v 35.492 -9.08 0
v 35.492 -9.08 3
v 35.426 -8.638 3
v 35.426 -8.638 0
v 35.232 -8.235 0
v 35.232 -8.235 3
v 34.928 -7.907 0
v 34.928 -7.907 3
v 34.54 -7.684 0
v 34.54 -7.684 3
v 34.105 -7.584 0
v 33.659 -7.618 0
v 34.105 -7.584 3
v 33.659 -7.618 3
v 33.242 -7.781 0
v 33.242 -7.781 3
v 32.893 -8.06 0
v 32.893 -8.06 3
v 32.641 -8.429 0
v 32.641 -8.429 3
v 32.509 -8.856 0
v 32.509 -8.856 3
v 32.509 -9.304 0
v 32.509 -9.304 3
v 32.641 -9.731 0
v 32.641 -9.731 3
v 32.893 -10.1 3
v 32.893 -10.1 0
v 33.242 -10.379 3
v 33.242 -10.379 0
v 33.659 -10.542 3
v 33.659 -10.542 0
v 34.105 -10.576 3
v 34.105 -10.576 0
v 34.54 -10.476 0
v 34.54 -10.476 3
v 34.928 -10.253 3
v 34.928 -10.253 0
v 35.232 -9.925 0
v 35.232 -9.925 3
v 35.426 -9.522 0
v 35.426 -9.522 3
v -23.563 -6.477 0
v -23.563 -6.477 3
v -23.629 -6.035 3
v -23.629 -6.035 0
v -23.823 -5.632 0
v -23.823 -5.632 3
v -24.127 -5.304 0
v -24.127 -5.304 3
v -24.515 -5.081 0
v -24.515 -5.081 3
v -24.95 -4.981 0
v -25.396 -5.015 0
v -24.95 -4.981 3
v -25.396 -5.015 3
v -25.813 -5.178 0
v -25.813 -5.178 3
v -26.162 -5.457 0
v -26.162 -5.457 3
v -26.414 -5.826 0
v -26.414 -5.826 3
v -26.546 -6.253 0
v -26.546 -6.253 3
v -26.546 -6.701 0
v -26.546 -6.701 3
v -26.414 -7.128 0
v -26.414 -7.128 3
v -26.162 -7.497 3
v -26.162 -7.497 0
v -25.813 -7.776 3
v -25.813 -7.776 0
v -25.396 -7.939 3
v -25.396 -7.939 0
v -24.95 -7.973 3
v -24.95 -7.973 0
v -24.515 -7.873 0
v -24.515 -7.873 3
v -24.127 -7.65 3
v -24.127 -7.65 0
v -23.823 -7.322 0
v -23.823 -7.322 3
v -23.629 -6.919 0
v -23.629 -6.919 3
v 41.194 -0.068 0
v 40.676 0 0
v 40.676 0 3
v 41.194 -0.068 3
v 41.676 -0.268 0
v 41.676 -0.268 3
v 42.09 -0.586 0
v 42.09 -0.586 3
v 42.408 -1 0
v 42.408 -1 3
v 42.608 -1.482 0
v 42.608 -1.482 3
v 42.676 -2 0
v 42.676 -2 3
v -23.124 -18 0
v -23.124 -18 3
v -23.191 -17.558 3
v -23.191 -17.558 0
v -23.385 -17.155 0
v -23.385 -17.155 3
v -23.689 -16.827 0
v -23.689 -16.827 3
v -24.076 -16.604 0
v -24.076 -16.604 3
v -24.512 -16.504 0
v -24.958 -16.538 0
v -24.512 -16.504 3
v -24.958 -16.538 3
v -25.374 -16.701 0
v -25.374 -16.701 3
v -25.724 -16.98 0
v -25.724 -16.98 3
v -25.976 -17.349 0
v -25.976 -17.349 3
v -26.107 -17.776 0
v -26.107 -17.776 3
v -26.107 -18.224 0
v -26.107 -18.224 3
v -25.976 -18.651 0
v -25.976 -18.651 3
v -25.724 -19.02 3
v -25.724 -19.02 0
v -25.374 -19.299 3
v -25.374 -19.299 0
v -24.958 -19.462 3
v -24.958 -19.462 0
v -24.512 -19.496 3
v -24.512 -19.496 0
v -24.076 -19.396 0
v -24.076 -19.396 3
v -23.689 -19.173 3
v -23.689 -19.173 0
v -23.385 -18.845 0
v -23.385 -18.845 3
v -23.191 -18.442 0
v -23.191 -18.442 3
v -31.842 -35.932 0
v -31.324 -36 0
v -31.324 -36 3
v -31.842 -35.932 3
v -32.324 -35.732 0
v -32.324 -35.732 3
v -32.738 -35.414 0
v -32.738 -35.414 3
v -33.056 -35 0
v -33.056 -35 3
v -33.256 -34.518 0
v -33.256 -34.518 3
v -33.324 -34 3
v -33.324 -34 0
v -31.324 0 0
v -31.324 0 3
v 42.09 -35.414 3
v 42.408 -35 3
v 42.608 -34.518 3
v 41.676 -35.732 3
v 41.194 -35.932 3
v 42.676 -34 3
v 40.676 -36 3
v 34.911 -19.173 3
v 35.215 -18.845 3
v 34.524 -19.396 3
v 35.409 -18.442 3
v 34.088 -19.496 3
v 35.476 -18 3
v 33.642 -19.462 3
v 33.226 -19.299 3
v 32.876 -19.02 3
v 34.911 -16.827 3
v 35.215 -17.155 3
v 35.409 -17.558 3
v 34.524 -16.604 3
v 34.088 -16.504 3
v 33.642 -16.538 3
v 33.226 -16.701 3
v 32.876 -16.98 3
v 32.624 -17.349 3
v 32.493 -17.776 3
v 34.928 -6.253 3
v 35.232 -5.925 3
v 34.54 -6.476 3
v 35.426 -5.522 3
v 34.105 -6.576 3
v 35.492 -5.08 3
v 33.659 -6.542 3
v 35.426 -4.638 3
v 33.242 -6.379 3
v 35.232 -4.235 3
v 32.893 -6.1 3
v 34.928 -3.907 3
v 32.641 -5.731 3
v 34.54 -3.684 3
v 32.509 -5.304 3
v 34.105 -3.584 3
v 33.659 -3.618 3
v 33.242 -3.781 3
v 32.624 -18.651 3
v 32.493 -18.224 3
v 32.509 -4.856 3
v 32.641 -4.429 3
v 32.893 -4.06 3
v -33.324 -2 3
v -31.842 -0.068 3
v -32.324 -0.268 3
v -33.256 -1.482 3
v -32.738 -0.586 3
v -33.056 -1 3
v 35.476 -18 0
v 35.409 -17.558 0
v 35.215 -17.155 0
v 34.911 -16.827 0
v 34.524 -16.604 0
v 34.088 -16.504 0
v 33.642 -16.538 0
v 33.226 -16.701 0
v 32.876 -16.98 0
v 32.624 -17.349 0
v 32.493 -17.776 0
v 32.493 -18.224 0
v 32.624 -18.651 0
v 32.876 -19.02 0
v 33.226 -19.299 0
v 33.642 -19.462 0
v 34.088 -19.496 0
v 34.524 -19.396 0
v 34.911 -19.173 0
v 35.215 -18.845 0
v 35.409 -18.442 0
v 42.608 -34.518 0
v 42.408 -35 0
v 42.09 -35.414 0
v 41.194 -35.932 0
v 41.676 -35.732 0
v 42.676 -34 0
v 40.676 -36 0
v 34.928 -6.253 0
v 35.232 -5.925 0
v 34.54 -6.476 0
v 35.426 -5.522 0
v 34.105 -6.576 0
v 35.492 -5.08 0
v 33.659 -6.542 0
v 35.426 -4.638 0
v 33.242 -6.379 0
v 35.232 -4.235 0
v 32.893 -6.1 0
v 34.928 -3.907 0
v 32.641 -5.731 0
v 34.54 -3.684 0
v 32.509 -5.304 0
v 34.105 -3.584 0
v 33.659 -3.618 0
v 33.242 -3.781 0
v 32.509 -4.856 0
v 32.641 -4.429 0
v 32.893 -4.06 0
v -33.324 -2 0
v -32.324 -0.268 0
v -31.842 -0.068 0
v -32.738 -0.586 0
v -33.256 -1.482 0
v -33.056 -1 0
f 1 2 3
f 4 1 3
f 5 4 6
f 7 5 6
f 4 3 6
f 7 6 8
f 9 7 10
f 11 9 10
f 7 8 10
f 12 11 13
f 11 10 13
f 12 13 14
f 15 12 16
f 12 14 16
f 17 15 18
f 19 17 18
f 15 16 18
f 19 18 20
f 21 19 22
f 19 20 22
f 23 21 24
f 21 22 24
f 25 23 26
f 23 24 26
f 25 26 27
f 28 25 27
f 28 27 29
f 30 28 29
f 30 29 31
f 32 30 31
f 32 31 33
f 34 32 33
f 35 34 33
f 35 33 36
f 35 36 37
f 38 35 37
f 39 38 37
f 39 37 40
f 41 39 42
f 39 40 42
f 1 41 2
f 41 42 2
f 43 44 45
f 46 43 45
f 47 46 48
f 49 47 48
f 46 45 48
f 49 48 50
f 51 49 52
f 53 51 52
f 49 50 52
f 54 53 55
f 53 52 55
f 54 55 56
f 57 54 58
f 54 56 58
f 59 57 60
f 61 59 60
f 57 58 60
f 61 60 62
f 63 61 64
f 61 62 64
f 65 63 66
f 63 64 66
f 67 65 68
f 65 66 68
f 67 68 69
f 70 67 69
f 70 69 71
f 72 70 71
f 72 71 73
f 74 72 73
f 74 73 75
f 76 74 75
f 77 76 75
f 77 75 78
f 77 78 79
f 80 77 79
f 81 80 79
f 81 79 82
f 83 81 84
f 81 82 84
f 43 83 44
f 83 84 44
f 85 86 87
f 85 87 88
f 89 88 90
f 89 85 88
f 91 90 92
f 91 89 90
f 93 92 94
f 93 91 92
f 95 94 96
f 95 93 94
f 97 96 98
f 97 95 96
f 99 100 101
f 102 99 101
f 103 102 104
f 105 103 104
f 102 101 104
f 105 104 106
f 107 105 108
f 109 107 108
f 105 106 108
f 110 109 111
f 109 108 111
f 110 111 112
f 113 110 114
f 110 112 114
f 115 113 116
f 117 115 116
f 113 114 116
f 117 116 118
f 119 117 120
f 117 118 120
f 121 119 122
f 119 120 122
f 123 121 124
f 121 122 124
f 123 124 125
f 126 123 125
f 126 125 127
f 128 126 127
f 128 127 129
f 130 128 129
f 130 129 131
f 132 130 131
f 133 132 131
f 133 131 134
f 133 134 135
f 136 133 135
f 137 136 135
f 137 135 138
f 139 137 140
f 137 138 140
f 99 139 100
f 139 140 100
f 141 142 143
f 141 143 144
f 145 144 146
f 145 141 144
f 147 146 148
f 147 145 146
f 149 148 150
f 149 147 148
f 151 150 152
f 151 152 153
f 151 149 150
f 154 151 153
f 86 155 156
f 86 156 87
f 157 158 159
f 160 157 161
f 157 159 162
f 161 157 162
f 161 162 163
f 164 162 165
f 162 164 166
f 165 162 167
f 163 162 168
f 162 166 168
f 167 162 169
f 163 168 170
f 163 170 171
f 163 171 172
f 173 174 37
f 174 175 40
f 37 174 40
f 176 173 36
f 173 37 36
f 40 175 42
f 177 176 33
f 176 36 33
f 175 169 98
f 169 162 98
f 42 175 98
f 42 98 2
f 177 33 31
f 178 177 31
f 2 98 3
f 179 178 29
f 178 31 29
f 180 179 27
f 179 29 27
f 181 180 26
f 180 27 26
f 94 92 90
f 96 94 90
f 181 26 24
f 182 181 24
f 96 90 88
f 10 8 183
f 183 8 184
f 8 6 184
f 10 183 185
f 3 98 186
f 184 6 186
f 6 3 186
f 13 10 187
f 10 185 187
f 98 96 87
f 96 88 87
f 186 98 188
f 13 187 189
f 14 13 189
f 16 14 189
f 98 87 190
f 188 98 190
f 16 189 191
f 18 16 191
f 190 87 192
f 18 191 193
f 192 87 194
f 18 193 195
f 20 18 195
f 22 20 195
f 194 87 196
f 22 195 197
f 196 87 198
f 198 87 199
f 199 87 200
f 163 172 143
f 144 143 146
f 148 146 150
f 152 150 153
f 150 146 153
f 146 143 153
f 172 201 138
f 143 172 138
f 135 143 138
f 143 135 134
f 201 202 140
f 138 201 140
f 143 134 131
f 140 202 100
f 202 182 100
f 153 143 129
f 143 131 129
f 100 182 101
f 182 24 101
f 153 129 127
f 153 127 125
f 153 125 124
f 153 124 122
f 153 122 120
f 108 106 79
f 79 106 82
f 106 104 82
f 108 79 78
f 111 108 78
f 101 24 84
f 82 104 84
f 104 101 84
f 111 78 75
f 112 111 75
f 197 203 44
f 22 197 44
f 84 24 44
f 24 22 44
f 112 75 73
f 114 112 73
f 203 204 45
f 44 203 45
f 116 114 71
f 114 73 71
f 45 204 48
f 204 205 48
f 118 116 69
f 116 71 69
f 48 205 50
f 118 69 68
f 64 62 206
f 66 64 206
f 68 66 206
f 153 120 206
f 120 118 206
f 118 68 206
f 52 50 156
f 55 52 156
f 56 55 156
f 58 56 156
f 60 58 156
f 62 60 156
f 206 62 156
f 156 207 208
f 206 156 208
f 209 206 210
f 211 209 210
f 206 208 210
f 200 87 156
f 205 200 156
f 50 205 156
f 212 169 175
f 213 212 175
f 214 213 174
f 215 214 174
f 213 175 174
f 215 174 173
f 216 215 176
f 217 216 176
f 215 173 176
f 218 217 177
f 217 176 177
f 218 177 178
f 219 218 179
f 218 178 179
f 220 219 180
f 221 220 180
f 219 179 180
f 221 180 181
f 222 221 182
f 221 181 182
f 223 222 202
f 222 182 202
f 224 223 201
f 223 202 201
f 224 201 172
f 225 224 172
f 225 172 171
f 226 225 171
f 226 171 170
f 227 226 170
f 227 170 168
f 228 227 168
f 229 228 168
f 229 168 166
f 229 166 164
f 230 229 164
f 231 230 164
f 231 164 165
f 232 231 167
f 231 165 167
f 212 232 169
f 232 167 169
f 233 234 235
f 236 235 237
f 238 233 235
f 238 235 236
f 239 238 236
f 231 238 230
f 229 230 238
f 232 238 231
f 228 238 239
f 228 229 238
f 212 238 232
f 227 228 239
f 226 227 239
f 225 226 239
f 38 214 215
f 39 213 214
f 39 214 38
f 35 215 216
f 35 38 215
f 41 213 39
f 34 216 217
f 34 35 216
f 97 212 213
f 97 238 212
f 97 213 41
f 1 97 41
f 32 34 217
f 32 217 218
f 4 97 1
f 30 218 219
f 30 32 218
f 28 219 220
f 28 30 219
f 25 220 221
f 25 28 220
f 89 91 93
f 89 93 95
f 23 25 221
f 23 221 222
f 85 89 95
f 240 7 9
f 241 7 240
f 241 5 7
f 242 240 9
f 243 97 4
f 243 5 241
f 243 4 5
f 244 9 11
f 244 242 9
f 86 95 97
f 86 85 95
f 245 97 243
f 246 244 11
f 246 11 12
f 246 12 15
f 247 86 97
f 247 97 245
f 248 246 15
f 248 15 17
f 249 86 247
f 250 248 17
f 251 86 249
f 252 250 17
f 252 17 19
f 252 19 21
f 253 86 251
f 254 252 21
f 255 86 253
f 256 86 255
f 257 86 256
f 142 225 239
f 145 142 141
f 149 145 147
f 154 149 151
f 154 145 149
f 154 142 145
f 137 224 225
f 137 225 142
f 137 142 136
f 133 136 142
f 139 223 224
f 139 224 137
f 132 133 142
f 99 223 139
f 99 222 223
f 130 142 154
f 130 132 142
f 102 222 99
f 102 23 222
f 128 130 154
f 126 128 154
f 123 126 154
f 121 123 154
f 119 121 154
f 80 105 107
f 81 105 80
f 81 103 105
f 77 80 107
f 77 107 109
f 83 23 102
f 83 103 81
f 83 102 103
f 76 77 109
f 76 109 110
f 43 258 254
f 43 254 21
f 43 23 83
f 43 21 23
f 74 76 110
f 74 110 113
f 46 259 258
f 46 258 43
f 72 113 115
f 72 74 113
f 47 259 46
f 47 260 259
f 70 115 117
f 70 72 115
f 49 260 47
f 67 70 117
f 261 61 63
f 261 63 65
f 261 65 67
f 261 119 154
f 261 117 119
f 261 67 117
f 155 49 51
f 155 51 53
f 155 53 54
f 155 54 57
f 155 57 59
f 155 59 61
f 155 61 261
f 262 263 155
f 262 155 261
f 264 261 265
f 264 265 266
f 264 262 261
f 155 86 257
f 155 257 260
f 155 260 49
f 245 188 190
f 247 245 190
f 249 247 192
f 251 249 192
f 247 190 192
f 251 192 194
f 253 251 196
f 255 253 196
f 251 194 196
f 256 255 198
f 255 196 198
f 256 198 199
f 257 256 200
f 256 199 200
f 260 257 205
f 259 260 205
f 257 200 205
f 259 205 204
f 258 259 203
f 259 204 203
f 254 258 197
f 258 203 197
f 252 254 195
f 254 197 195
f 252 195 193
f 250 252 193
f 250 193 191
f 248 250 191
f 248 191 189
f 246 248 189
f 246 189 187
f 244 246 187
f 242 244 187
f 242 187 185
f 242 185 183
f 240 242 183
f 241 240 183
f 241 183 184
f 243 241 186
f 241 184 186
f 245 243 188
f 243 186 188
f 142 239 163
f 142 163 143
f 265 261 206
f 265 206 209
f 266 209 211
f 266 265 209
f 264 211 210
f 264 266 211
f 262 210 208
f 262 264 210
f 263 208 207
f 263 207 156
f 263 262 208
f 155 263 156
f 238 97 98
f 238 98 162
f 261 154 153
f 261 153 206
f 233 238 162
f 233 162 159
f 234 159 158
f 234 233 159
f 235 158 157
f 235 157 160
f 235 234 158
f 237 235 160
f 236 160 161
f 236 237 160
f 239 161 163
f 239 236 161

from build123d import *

# Parameters (mm, degrees)
EXTRUDE_1_DEPTH     = 3
SKETCH_2_R          = 1.5
CUT_EXTRUDE_1_DEPTH = 3


with BuildPart() as part:
    # 草图1 → 凸台-拉伸1 (new body)
    with BuildSketch(Plane.XY):
        with BuildLine():
            Line((-31.324082862, 0), (40.675917138, 0))
            ThreePointArc((40.675917138, 0), (42.090130701, -0.585786438), (42.675917138, -2))
            Line((42.675917138, -2), (42.675917138, -34))
            ThreePointArc((42.675917138, -34), (42.090130701, -35.414213562), (40.675917138, -36))
            Line((40.675917138, -36), (-31.324082862, -36))
            ThreePointArc((-31.324082862, -36), (-32.738296424, -35.414213562), (-33.324082862, -34))
            Line((-33.324082862, -34), (-33.324082862, -2))
            ThreePointArc((-33.324082862, -2), (-32.738296424, -0.585786438), (-31.324082862, 0))
        make_face()
    extrude(amount=EXTRUDE_1_DEPTH)

    # 草图2 → 切除-拉伸1 (cut)
    with BuildSketch(Plane.XY.offset(3)):
        with Locations((-24.624082862, -18)):
            Circle(SKETCH_2_R)
        with Locations((33.975917138, -18)):
            Circle(SKETCH_2_R)
        with Locations((-25.062556893, -6.477)):
            Circle(SKETCH_2_R)
        with Locations((33.992443107, -5.08)):
            Circle(SKETCH_2_R)
        with Locations((33.992443107, -9.08)):
            Circle(SKETCH_2_R)
    extrude(amount=-CUT_EXTRUDE_1_DEPTH, mode=Mode.SUBTRACT)


solid = part.part
